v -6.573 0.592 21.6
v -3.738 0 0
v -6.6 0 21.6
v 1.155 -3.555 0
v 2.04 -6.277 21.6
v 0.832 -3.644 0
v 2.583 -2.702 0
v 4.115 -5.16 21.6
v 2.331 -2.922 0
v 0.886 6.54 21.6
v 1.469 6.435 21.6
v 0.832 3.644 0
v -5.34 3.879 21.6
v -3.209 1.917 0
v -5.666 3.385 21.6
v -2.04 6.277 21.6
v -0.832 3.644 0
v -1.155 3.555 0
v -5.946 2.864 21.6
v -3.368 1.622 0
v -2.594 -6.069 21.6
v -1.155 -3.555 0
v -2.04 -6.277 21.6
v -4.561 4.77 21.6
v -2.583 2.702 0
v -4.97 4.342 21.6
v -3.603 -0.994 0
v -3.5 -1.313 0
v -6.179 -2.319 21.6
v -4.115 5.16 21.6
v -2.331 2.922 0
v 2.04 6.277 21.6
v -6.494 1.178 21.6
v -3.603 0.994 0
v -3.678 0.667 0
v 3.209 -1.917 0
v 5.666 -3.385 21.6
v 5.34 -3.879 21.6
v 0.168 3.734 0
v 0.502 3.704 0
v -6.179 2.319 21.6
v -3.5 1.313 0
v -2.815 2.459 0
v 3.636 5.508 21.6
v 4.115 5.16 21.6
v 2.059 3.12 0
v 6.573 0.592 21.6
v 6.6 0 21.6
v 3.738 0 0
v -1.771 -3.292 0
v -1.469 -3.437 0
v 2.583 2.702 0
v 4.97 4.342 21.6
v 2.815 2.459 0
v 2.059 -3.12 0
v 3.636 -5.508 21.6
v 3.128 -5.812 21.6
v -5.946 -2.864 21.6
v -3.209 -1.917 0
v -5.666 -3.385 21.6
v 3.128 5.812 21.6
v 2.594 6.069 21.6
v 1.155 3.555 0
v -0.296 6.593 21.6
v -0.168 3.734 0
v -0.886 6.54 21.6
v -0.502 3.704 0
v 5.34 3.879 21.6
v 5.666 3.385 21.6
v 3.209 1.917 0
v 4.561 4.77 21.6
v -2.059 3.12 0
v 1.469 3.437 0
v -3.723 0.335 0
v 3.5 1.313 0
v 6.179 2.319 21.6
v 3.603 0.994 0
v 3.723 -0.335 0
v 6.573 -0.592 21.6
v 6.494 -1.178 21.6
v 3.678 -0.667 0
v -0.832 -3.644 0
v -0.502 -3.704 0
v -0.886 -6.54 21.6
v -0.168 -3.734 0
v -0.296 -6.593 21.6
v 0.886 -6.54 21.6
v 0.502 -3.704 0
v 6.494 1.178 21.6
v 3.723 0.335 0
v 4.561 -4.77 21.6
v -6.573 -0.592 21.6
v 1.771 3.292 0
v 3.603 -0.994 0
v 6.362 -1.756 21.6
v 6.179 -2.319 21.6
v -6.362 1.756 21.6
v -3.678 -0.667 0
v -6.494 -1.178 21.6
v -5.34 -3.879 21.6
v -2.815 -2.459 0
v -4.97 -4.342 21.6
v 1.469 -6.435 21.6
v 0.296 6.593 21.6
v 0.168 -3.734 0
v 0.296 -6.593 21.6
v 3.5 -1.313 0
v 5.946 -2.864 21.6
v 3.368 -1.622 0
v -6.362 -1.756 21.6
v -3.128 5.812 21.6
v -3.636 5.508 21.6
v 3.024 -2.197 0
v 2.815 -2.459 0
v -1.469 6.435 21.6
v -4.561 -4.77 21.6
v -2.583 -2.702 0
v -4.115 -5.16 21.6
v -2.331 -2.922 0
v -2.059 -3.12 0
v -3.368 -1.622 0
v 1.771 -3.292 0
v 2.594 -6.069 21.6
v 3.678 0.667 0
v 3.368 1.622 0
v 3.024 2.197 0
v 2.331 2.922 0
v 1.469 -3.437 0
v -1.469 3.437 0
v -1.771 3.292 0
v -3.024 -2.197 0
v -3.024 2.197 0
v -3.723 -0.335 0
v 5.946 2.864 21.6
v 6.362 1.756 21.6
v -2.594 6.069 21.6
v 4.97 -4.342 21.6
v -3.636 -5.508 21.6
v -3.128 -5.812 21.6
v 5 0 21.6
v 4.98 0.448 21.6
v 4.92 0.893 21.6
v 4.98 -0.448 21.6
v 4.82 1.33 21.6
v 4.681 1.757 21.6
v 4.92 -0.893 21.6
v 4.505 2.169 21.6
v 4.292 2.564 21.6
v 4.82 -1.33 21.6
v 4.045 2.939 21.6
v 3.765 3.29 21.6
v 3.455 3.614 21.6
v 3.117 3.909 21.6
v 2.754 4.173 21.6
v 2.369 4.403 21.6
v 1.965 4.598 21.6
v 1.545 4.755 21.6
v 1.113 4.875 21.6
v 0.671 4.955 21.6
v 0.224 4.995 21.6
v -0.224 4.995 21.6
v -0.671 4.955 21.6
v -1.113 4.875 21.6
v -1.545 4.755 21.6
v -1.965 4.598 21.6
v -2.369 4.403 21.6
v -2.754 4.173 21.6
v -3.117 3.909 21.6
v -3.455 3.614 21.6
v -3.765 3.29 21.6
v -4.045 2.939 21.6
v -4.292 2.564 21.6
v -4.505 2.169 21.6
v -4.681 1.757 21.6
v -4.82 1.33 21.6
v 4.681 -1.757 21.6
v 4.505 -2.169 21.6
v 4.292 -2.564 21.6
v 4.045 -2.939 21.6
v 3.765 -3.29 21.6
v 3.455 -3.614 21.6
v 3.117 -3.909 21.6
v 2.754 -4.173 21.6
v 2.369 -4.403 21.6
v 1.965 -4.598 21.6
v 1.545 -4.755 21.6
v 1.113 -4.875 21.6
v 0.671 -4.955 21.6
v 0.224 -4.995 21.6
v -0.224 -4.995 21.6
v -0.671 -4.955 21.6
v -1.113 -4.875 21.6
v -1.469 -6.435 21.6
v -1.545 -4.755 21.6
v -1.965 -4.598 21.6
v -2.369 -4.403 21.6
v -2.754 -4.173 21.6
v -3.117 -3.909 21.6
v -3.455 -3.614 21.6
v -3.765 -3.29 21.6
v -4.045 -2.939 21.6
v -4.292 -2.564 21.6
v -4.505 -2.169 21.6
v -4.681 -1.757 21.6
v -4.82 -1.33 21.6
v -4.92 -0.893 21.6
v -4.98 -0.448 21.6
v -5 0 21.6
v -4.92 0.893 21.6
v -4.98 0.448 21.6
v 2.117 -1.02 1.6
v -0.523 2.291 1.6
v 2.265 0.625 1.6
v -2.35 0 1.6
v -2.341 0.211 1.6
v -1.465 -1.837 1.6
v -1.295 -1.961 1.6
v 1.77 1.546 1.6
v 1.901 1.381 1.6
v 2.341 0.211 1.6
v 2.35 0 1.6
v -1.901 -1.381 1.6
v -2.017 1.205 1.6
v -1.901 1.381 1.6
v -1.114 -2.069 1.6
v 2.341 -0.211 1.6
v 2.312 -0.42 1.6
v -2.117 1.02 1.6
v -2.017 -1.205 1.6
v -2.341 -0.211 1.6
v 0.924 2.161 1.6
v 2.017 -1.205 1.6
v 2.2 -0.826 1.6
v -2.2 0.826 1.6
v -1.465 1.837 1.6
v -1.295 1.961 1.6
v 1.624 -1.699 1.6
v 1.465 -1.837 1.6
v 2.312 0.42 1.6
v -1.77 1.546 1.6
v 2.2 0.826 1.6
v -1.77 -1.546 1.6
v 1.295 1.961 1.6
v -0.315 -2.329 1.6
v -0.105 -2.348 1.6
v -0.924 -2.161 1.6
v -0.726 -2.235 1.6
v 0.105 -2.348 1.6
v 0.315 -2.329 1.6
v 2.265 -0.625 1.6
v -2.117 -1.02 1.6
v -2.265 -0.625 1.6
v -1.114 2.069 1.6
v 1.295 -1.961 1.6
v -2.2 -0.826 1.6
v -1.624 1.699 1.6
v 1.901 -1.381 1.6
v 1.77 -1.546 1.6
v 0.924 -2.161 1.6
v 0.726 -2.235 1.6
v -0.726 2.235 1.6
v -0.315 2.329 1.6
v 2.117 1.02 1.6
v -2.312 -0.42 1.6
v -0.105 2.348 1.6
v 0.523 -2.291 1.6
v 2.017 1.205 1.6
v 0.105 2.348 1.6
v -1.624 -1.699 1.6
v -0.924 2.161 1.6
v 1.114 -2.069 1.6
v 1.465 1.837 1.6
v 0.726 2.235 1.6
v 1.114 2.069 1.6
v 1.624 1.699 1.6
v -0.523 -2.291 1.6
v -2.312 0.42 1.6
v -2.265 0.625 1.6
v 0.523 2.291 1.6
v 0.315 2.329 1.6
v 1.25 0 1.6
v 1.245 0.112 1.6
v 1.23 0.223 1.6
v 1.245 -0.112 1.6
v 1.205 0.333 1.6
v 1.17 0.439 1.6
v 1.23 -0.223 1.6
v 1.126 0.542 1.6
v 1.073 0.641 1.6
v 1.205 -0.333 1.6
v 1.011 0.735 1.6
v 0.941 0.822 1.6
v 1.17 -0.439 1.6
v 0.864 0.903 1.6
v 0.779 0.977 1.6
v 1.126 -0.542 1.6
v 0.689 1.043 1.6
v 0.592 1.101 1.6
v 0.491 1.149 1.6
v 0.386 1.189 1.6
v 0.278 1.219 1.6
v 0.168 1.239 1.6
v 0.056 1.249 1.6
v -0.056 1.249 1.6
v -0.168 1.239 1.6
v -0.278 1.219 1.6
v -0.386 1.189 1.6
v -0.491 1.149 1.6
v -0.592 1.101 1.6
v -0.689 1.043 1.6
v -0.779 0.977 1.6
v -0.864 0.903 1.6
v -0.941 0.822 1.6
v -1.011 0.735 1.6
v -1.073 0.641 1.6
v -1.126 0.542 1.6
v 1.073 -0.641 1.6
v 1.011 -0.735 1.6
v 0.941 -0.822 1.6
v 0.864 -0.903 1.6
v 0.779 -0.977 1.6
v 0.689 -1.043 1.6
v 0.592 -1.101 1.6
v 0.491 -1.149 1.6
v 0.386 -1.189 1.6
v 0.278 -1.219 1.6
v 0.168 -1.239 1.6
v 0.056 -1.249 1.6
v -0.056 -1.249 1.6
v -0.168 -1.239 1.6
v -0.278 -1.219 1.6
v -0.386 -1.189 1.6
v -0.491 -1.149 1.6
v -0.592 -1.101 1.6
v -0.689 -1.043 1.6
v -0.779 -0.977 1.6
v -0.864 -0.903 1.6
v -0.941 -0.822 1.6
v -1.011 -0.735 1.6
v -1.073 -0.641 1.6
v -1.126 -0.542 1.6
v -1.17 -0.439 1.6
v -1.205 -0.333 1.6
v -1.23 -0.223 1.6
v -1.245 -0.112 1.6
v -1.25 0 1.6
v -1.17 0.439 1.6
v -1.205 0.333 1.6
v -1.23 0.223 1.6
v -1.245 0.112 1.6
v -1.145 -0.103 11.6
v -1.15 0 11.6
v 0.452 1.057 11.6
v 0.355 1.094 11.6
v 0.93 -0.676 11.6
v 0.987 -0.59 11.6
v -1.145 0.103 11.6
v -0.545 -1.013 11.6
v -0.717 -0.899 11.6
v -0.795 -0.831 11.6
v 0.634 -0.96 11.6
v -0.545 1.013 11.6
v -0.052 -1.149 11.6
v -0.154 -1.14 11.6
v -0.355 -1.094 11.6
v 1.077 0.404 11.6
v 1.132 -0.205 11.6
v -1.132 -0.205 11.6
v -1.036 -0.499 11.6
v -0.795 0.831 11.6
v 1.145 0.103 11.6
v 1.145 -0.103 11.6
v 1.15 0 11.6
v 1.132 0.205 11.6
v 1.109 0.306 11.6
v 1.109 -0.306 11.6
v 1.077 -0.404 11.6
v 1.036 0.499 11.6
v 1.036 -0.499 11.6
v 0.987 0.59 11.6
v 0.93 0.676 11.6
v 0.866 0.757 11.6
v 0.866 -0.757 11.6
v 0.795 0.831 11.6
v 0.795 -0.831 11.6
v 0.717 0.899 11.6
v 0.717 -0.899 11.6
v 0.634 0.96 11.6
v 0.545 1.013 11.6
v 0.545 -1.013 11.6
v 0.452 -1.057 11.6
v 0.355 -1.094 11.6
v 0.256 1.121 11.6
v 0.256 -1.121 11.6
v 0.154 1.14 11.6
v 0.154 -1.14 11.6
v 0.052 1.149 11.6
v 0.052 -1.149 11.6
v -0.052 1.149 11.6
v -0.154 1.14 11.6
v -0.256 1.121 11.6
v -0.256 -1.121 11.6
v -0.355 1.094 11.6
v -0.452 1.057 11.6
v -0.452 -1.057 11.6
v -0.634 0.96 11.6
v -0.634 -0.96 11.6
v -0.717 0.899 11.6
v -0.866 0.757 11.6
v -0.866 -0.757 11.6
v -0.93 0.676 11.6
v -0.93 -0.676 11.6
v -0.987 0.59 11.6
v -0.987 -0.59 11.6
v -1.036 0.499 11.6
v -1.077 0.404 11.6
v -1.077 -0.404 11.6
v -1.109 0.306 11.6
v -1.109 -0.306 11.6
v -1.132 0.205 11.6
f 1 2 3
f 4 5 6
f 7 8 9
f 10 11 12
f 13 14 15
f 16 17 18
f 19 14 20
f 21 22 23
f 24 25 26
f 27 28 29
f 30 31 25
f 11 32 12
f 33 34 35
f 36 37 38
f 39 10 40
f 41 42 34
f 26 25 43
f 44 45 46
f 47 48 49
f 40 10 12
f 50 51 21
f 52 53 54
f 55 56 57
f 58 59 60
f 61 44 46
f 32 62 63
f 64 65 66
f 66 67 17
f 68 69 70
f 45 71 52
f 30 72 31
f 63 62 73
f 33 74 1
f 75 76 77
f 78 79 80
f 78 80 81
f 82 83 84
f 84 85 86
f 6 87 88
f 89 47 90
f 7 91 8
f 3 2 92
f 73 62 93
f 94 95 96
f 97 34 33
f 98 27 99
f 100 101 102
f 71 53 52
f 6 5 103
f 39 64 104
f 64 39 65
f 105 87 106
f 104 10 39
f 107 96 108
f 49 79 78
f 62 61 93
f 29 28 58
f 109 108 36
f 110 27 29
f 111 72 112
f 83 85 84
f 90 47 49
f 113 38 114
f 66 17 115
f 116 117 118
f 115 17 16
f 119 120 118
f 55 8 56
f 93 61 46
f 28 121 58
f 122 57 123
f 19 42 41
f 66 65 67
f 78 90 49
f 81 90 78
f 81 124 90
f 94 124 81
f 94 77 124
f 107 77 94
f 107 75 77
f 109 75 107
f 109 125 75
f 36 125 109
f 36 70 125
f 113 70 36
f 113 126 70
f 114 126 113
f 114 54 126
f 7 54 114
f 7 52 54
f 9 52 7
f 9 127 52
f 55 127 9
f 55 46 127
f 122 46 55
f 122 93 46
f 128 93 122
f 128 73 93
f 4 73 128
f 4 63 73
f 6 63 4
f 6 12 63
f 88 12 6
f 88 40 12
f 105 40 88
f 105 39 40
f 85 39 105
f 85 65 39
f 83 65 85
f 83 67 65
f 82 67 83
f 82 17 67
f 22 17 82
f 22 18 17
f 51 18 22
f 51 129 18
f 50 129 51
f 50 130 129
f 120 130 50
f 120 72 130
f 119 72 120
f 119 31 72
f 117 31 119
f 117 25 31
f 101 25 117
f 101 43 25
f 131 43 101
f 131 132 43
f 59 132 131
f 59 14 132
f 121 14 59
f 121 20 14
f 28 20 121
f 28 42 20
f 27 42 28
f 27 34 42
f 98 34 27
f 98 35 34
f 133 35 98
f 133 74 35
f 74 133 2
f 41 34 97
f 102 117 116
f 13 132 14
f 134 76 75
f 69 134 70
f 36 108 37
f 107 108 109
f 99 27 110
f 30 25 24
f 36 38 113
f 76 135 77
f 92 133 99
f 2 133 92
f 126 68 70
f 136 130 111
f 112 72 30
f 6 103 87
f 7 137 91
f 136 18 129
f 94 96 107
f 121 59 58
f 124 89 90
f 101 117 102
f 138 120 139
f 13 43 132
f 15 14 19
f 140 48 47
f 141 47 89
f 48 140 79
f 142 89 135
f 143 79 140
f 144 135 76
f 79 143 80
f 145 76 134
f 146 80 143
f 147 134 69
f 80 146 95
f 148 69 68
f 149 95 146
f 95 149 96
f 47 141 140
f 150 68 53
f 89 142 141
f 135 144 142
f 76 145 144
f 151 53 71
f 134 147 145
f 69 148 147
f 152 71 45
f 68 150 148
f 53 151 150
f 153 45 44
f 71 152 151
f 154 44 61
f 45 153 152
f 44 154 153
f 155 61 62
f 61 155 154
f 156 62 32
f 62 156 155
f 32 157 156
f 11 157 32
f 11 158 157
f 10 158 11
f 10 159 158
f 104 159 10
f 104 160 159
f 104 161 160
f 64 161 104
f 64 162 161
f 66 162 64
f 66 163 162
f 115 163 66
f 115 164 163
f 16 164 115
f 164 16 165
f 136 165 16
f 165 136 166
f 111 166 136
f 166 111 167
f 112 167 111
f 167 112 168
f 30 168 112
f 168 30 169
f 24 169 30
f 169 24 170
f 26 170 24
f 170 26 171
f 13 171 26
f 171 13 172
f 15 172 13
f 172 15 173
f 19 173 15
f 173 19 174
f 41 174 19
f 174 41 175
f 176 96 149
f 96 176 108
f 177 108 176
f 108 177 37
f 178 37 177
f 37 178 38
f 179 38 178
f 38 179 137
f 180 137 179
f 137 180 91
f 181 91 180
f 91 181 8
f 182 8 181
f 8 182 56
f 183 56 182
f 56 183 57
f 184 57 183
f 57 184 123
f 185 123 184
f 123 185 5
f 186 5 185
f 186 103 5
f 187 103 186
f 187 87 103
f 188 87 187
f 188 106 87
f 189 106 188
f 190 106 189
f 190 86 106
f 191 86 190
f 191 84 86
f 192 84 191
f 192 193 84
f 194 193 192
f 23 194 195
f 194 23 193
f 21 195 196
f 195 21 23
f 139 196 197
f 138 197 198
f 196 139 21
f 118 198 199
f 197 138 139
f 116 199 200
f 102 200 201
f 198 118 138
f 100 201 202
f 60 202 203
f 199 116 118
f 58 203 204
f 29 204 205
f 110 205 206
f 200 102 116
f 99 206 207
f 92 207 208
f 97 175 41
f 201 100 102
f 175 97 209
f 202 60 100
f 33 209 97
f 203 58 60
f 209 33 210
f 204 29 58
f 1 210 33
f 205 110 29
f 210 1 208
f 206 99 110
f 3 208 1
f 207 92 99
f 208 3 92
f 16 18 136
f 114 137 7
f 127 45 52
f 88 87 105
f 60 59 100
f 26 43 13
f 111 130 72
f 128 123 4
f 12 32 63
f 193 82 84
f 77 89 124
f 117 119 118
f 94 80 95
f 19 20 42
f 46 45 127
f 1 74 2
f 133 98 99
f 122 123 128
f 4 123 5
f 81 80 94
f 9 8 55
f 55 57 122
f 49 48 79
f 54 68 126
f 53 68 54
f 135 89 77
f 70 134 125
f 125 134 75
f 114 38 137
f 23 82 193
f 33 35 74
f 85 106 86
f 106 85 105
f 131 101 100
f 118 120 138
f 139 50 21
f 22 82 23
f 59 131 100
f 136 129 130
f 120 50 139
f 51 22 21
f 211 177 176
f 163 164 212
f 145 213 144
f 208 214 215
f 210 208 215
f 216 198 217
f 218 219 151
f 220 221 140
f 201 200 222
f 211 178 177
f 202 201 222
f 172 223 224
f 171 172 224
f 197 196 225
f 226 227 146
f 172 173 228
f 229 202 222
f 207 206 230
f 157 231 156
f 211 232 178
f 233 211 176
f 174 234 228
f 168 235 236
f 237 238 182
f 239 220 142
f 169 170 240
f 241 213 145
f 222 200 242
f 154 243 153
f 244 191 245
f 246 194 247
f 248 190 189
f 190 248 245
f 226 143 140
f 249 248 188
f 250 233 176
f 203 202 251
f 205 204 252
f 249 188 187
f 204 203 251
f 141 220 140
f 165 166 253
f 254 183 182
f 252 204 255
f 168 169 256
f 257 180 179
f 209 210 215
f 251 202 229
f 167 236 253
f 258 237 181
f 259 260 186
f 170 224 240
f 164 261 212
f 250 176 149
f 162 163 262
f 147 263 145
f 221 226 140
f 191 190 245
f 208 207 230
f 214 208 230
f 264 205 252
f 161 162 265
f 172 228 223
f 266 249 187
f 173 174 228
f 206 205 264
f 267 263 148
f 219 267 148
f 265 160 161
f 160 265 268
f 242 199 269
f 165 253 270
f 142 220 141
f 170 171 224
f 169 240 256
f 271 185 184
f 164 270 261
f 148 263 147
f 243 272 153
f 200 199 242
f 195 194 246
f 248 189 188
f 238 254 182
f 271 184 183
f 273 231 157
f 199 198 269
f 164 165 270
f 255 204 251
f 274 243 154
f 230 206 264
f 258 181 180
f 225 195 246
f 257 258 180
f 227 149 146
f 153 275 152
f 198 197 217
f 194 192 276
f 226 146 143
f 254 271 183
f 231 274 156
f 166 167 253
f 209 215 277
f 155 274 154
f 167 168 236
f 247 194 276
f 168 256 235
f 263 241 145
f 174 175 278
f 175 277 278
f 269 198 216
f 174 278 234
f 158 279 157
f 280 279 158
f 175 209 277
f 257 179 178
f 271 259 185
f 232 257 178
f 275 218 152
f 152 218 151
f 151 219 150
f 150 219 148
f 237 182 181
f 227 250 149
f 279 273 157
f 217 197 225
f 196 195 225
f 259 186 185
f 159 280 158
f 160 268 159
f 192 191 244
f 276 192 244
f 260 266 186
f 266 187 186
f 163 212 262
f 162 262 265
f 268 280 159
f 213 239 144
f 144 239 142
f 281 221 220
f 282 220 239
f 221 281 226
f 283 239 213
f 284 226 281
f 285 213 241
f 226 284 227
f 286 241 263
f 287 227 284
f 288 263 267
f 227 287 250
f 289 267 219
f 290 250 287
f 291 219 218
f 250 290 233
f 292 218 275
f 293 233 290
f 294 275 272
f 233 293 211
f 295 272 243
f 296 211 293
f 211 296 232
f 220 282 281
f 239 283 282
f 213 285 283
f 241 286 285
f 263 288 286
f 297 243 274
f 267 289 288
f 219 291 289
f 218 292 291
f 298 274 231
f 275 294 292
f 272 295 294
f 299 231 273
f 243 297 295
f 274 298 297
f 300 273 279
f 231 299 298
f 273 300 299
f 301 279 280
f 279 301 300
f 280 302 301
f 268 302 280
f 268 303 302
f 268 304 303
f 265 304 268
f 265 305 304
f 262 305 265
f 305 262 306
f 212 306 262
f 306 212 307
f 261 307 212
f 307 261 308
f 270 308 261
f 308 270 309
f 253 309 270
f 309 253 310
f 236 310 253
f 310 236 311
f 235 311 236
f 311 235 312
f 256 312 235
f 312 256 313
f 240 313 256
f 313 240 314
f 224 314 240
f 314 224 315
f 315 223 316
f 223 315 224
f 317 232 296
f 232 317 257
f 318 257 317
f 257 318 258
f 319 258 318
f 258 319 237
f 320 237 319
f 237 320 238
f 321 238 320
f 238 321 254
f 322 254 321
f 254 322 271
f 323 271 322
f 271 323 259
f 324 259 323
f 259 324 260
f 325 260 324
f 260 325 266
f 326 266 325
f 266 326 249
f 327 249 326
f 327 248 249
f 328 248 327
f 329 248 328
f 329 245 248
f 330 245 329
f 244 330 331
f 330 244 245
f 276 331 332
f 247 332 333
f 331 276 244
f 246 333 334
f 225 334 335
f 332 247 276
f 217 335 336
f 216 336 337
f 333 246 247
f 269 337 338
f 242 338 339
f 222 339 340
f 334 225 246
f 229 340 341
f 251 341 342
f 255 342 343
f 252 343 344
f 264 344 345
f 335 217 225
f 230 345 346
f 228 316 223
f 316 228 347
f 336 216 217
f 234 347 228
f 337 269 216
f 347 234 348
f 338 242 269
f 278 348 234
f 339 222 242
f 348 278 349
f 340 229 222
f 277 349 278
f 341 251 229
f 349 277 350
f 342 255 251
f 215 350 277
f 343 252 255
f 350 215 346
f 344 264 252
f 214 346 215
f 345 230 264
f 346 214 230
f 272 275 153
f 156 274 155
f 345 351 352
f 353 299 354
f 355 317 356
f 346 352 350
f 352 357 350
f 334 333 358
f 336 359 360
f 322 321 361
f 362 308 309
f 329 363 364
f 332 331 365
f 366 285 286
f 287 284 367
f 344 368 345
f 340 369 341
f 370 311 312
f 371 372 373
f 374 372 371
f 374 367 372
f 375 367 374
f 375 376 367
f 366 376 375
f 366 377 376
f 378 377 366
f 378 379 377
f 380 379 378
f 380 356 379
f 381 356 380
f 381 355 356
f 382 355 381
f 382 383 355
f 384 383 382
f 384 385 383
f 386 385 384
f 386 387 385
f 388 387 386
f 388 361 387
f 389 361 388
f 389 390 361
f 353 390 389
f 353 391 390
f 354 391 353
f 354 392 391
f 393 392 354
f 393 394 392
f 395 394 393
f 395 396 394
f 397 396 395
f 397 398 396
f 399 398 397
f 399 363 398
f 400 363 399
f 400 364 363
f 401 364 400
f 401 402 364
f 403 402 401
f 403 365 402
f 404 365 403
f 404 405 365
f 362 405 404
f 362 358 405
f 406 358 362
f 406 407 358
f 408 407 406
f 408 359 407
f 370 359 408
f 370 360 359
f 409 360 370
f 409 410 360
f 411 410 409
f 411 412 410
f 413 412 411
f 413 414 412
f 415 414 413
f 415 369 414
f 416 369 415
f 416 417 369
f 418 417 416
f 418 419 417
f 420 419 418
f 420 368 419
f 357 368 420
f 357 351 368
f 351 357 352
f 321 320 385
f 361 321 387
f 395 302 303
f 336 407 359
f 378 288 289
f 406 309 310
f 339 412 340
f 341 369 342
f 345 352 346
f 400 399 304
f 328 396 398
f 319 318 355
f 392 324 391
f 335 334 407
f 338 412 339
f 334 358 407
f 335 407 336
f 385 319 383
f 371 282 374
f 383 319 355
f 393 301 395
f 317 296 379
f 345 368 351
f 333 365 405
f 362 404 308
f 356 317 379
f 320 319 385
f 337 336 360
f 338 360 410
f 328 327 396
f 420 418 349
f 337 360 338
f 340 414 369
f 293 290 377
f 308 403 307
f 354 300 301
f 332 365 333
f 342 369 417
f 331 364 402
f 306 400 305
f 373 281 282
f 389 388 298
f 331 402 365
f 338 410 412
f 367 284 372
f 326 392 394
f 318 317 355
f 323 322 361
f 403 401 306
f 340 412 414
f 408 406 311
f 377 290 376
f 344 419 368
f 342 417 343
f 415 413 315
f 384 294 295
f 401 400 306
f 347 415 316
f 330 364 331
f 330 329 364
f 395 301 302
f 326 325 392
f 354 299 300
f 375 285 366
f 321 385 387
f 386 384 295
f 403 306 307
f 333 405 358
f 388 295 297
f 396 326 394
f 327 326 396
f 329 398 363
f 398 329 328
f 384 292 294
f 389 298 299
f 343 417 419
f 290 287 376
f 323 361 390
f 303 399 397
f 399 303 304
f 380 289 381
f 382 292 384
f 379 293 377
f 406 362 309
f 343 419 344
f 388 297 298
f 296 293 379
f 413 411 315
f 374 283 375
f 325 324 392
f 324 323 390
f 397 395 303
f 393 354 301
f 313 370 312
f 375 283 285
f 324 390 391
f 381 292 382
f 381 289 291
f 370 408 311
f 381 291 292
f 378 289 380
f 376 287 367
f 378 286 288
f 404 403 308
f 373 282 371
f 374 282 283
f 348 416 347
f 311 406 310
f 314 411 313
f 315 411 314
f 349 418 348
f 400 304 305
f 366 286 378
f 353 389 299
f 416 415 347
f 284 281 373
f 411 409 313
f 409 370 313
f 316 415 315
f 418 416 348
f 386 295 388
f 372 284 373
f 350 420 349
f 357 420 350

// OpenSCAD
//tip outer diameter
top_od = 4.5;
//1cm down outer diameter
one_cm_od = 7.15 ;
//inner diameter of opening
top_id = 2.3;
//thickness of walls in the x-y axis
wall_thickness = 1.6;
//height of cap (not including wall thickness)
height = 20;
//ammount your 3d printer erodes holes and dialates outer diameters.
compensation_factor = 0.2;



cf = compensation_factor*1;
slope = (one_cm_od-top_od)/10;

translate([0,0,height+wall_thickness])
rotate([0, 180, 0])
union() {
	difference() {
		cylinder(h=height+wall_thickness,d1=top_od+cf+slope*height+2*wall_thickness,
			d2=top_od+cf+2*wall_thickness-wall_thickness*slope,$fn=70);
		cylinder(h=height,d1=top_od+cf+slope*height,d2=top_od+cf,$fn=70);
	}
	translate([0, 0, height-10])
	cylinder(h=10,d1=top_id,d2=top_id+cf,$fn=70 );
}
